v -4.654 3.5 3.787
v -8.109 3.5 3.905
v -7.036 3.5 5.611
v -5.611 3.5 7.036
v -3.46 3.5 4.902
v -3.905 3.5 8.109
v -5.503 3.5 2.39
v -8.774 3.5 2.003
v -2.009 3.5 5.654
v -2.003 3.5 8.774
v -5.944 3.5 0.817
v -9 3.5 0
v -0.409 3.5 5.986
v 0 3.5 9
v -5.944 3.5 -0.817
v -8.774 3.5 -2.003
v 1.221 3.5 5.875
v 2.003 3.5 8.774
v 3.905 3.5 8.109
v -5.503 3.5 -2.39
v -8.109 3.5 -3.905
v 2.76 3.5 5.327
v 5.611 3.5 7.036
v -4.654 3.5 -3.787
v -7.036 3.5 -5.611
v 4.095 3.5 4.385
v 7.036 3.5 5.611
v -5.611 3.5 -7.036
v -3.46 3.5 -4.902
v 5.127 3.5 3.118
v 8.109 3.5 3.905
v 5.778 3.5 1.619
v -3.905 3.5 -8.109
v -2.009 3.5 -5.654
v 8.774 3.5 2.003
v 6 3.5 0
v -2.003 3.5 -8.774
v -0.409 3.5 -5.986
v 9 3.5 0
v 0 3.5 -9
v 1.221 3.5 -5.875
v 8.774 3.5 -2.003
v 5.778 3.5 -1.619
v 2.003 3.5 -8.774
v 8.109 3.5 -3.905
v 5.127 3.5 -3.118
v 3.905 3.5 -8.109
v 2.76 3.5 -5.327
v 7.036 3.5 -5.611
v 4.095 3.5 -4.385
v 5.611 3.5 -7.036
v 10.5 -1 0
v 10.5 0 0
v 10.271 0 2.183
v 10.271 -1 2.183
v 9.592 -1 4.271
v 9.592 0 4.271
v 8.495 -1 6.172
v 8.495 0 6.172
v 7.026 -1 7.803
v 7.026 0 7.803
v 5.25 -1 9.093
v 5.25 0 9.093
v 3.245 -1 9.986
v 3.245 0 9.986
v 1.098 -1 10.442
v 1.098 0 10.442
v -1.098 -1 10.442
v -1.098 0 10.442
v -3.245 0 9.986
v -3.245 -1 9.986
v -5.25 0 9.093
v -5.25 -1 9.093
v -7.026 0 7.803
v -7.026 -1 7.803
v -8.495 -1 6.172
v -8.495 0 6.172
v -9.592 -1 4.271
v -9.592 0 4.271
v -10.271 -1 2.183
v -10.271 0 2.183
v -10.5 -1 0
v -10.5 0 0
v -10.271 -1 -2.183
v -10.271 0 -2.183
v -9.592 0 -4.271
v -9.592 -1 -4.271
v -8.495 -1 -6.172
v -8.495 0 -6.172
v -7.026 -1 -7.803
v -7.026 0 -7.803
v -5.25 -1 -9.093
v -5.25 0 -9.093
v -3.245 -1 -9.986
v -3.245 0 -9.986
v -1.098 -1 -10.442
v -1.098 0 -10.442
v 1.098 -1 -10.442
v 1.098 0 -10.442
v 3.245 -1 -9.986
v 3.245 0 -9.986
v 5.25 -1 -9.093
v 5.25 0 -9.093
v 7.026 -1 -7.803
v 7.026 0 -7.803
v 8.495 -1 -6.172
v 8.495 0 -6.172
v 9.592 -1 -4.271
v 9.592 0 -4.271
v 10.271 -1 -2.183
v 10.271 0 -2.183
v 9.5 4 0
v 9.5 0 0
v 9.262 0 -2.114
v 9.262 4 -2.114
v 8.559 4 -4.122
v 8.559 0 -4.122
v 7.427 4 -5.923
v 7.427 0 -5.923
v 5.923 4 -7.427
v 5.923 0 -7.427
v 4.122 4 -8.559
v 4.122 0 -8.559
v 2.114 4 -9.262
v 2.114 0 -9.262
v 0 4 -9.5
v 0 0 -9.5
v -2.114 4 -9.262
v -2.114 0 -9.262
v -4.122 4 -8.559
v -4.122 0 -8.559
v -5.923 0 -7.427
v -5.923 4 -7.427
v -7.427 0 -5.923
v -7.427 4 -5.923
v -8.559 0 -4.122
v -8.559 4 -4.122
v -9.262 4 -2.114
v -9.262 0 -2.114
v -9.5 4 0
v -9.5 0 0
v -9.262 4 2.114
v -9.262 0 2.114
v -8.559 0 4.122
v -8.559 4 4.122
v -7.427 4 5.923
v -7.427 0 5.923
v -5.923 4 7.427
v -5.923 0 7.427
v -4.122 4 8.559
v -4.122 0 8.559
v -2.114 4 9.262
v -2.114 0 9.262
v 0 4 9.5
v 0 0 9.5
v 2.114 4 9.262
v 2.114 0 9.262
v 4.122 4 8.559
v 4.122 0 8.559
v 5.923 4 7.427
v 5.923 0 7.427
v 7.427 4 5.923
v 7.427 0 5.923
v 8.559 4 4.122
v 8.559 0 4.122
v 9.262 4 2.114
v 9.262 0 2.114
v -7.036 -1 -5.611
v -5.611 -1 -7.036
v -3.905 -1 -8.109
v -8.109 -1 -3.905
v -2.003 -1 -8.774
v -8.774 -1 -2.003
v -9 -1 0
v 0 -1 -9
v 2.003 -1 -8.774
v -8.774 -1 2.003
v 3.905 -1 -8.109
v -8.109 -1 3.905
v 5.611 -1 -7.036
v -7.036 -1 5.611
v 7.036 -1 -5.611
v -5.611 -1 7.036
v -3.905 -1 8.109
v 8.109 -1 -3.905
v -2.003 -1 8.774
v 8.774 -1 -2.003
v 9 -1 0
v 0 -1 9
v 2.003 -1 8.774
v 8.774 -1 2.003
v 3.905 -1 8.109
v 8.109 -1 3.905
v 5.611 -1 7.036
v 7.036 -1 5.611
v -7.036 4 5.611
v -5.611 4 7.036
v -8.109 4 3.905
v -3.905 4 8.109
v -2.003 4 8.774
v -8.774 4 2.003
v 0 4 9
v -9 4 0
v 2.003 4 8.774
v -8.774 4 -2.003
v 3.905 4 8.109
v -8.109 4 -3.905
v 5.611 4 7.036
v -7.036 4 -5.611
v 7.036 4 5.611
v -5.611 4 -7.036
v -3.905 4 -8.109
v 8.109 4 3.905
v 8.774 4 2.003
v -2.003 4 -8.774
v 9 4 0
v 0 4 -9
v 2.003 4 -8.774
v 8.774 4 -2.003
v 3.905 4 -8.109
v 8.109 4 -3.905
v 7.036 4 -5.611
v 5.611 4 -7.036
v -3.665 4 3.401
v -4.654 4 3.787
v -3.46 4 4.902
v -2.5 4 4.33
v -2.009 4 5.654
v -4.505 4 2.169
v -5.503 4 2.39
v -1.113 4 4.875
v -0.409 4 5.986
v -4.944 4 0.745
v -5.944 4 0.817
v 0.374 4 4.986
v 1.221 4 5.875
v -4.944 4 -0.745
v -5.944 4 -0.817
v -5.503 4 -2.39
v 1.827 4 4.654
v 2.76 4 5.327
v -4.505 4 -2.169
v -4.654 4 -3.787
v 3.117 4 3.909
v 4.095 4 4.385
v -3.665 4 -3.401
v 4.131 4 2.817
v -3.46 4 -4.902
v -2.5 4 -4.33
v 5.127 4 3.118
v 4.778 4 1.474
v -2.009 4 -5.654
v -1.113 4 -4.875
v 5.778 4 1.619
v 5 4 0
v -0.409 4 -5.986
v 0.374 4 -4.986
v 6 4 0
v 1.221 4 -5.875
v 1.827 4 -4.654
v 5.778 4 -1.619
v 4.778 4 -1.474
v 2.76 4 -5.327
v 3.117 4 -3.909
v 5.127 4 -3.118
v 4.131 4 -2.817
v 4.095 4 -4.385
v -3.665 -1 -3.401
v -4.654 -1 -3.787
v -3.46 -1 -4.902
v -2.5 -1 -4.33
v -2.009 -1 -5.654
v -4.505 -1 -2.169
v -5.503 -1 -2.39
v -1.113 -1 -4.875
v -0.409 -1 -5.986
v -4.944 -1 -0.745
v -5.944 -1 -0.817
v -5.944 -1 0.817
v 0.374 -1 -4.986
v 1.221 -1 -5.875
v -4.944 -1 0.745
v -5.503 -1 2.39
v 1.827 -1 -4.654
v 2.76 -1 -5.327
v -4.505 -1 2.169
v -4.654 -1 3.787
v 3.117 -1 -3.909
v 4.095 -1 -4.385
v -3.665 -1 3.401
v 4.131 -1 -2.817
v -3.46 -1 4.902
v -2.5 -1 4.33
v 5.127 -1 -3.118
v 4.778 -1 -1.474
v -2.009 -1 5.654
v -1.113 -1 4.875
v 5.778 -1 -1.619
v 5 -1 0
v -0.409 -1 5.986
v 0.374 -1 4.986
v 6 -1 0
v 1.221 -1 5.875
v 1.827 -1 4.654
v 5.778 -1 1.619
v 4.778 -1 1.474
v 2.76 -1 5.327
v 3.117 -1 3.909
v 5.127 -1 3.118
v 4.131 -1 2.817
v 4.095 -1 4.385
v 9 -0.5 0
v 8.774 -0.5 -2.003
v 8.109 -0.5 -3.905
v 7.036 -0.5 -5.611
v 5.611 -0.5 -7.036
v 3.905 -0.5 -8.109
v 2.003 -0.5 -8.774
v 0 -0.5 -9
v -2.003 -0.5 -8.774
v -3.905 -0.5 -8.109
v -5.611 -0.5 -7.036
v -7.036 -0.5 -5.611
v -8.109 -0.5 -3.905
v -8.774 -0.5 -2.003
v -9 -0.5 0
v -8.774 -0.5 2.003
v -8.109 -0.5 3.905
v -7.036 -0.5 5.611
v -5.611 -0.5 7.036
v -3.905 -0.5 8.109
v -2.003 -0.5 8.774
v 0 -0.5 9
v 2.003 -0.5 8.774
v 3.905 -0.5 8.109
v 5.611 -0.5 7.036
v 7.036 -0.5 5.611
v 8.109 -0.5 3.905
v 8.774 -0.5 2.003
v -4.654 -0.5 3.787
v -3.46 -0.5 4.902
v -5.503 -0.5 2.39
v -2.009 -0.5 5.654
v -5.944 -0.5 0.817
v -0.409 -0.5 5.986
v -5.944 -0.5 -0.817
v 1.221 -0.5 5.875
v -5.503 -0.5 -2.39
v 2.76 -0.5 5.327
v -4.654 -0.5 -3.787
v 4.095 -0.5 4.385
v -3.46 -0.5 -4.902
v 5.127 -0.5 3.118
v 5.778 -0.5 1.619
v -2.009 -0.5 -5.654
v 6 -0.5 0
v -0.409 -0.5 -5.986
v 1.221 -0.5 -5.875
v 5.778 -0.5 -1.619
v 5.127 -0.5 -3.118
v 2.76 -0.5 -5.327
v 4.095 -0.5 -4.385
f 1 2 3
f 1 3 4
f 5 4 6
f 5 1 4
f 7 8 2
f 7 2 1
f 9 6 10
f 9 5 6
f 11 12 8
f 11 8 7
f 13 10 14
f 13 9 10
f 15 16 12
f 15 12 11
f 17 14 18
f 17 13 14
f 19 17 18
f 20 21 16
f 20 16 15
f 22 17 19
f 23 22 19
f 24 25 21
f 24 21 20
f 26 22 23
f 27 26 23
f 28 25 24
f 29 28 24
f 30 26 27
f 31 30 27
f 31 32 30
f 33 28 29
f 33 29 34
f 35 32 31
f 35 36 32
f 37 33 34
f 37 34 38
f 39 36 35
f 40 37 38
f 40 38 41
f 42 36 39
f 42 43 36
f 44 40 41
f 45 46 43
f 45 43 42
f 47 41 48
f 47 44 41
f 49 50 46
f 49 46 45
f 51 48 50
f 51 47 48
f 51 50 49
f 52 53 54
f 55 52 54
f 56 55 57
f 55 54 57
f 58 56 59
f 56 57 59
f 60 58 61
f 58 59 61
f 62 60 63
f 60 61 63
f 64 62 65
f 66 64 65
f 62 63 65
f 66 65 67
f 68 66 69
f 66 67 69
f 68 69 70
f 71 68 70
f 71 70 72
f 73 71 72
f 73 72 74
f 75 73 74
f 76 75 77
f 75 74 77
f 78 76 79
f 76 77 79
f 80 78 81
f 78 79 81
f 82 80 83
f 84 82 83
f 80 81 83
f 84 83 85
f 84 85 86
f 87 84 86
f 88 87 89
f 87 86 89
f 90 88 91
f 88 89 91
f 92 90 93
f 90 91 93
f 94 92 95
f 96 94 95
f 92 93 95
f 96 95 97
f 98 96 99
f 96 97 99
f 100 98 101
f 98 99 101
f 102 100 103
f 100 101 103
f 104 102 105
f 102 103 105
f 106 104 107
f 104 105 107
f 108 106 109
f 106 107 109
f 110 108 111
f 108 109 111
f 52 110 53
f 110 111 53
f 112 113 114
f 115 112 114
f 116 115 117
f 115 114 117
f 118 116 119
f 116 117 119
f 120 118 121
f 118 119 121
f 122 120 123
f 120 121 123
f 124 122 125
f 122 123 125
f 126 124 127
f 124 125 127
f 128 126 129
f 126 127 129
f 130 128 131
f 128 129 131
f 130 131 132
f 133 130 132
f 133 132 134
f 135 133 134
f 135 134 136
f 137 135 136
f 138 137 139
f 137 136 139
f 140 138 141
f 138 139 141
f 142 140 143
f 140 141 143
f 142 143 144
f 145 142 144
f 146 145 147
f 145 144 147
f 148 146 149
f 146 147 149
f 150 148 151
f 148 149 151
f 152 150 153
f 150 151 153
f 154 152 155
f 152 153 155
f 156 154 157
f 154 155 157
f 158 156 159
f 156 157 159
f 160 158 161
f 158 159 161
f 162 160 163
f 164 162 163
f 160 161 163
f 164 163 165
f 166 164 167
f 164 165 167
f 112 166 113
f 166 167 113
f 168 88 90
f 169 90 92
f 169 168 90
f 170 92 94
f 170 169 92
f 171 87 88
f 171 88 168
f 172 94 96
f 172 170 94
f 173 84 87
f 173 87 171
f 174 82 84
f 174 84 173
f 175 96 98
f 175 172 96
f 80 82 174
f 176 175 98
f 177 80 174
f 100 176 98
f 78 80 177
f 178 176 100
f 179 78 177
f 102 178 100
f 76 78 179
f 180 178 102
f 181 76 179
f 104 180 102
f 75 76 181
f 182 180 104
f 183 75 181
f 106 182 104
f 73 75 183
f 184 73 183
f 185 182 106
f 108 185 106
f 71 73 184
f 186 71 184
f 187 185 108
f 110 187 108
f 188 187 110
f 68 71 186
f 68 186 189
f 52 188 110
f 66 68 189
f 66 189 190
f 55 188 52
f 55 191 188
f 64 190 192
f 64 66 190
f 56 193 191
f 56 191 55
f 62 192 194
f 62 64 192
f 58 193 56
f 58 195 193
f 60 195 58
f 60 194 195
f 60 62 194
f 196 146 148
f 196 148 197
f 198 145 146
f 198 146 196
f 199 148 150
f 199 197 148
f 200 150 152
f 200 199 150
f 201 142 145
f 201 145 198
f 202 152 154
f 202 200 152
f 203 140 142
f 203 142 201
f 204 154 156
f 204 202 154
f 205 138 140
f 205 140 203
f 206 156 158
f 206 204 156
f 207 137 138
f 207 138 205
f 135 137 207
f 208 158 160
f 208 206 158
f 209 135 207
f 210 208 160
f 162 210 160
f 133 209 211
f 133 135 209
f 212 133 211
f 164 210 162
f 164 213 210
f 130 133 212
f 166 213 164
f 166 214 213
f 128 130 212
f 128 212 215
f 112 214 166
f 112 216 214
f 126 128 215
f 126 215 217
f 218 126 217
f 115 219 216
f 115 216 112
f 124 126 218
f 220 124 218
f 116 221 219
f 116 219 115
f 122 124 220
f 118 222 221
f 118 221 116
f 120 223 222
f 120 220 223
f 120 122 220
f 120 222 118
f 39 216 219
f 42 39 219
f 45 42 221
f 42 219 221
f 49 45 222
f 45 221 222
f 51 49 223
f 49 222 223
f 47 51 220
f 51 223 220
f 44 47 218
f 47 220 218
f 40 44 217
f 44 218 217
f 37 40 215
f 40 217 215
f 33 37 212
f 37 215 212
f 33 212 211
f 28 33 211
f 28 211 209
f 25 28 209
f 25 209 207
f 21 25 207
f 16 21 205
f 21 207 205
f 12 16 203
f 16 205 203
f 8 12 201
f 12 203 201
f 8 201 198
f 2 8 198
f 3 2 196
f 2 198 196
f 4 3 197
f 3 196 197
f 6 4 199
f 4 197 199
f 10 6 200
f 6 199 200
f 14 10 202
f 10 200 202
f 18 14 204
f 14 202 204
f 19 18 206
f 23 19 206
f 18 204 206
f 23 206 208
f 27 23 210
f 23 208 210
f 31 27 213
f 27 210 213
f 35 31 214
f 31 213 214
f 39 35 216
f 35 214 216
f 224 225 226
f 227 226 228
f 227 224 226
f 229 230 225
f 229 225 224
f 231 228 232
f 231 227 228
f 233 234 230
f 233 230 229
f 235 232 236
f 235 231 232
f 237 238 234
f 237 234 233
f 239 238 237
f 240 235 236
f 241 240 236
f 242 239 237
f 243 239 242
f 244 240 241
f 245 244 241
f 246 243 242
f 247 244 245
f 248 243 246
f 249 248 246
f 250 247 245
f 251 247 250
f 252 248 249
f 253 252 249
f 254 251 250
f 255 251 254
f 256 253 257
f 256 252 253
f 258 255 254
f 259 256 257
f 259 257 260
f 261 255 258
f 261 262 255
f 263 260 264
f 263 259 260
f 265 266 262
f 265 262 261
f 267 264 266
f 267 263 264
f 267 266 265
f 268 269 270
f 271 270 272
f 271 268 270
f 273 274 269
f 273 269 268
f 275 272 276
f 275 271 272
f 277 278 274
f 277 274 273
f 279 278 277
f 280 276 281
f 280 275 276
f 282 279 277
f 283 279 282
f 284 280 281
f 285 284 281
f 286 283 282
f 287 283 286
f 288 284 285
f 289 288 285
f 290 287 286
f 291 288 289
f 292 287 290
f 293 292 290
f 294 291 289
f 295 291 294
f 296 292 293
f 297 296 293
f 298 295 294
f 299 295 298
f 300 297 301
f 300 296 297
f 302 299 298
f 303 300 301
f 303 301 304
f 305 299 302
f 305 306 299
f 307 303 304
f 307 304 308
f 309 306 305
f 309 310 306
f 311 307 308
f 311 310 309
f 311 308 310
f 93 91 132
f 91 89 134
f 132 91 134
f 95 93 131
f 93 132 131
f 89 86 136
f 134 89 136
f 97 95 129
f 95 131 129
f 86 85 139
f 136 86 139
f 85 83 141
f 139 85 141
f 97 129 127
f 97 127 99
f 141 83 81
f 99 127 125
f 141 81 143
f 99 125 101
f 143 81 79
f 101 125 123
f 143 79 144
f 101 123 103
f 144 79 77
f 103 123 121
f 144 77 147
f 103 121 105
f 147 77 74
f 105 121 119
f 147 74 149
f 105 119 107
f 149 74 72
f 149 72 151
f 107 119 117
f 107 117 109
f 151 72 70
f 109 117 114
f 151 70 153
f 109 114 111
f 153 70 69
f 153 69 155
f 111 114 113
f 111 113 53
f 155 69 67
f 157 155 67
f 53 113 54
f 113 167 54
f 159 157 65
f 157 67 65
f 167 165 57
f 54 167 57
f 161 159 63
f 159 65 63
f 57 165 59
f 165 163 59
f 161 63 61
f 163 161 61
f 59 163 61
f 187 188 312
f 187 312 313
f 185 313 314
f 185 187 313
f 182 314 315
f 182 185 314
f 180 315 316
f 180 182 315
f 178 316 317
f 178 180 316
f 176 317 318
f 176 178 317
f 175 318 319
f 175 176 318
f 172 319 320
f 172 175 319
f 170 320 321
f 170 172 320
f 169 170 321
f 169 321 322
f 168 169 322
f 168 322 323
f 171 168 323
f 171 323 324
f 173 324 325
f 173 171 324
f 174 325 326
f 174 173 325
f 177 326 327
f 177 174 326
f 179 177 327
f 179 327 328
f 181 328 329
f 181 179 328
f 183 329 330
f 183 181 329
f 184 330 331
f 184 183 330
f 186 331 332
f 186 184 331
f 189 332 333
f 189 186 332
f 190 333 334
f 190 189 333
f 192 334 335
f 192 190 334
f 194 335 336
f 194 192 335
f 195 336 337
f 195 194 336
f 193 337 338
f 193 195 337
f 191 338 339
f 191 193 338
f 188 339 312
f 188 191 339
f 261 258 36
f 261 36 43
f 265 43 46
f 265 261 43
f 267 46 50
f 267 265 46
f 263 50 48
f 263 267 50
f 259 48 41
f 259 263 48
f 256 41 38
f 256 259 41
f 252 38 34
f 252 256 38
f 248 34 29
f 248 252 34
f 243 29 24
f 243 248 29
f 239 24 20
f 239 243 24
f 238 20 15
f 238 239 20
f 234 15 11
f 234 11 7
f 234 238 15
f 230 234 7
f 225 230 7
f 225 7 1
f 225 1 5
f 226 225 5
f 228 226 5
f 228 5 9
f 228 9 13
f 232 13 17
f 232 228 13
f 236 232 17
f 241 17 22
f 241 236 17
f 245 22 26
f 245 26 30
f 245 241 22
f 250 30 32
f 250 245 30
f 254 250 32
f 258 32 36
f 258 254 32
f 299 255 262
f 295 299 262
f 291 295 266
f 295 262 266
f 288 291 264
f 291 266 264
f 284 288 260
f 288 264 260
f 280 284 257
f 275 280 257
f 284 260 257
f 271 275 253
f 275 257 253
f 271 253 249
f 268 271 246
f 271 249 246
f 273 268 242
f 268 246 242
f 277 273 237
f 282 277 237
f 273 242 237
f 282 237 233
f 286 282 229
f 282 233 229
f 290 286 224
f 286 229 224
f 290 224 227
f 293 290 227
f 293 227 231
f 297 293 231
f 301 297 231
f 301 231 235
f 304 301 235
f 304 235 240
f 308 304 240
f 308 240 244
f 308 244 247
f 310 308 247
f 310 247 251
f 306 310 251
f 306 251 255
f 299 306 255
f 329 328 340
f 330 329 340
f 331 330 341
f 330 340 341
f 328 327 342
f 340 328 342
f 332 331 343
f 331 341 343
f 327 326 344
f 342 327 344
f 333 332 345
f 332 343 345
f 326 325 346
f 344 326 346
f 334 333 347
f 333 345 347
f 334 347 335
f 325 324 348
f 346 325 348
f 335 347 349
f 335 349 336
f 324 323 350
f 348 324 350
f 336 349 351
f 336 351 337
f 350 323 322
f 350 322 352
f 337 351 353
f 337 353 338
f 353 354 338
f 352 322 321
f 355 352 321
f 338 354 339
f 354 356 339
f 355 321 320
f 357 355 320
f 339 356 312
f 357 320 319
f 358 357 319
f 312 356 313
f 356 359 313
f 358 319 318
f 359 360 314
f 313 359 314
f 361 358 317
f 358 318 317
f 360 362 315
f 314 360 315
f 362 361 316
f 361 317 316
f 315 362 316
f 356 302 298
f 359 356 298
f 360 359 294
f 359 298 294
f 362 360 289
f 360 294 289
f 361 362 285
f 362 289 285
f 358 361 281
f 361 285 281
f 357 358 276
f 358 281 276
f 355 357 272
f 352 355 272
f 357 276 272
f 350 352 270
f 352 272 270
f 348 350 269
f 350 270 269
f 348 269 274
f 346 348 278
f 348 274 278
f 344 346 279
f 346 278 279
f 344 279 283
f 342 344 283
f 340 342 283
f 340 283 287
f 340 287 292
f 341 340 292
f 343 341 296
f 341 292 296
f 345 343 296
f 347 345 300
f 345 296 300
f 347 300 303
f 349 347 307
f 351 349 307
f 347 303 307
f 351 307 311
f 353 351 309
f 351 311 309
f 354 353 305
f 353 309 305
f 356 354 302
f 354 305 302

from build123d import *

# Parameters (mm, degrees)
SKETCH_1_R          = 9.5
EXTRUDE_1_DEPTH     = 4
SKETCH_2_R          = 10.5
EXTRUDE_2_DEPTH     = 1
CUT_EXTRUDE_1_REACH = 7
SKETCH_3_R          = 5
SKETCH_4_R          = 9
SKETCH_4_R_2        = 6
CUT_EXTRUDE_2_DEPTH = 0.5
CUT_EXTRUDE_START   = -5
SKETCH_4_2_R        = 9
SKETCH_4_2_R_2      = 6
CUT_EXTRUDE_5_DEPTH = 0.5


with BuildPart() as part:
    # Sketch 1 → Extrude 1 (new body)
    with BuildSketch(Plane(origin=(0, 0, 0), x_dir=(1, 0, 0), z_dir=(0, 1, 0))):
        Circle(SKETCH_1_R)
    extrude(amount=EXTRUDE_1_DEPTH)

    # Sketch 2 → Extrude 2 (add)
    with BuildSketch(Plane.XZ):
        Circle(SKETCH_2_R)
    extrude(amount=EXTRUDE_2_DEPTH)

    # Sketch 3 → Cut-Extrude 1 (cut, up to next)
    with BuildSketch(Plane(origin=(0, 4, 0), x_dir=(1, 0, 0), z_dir=(0, 1, 0)), mode=Mode.PRIVATE) as cut_extrude_1_sk1:
        Circle(SKETCH_3_R)
    cut_extrude_1_tool1 = extrude(cut_extrude_1_sk1.sketch, amount=-CUT_EXTRUDE_1_REACH, mode=Mode.PRIVATE) & part.part
    add(cut_extrude_1_tool1.solids().sort_by_distance((0, 4, 0))[0], mode=Mode.SUBTRACT)

    # Sketch 4 → Cut-Extrude 2 (cut)
    with BuildSketch(Plane(origin=(0, 4, 0), x_dir=(1, 0, 0), z_dir=(0, 1, 0))):
        Circle(SKETCH_4_R)
        Circle(SKETCH_4_R_2, mode=Mode.SUBTRACT)
    extrude(amount=-CUT_EXTRUDE_2_DEPTH, mode=Mode.SUBTRACT)

    # Sketch 4_2 → Cut-Extrude 5 (cut)
    with BuildSketch(Plane(origin=(0, 4, 0), x_dir=(1, 0, 0), z_dir=(0, 1, 0)).offset(CUT_EXTRUDE_START)):
        Circle(SKETCH_4_2_R)
        Circle(SKETCH_4_2_R_2, mode=Mode.SUBTRACT)
    extrude(amount=CUT_EXTRUDE_5_DEPTH, mode=Mode.SUBTRACT)


solid = part.part
